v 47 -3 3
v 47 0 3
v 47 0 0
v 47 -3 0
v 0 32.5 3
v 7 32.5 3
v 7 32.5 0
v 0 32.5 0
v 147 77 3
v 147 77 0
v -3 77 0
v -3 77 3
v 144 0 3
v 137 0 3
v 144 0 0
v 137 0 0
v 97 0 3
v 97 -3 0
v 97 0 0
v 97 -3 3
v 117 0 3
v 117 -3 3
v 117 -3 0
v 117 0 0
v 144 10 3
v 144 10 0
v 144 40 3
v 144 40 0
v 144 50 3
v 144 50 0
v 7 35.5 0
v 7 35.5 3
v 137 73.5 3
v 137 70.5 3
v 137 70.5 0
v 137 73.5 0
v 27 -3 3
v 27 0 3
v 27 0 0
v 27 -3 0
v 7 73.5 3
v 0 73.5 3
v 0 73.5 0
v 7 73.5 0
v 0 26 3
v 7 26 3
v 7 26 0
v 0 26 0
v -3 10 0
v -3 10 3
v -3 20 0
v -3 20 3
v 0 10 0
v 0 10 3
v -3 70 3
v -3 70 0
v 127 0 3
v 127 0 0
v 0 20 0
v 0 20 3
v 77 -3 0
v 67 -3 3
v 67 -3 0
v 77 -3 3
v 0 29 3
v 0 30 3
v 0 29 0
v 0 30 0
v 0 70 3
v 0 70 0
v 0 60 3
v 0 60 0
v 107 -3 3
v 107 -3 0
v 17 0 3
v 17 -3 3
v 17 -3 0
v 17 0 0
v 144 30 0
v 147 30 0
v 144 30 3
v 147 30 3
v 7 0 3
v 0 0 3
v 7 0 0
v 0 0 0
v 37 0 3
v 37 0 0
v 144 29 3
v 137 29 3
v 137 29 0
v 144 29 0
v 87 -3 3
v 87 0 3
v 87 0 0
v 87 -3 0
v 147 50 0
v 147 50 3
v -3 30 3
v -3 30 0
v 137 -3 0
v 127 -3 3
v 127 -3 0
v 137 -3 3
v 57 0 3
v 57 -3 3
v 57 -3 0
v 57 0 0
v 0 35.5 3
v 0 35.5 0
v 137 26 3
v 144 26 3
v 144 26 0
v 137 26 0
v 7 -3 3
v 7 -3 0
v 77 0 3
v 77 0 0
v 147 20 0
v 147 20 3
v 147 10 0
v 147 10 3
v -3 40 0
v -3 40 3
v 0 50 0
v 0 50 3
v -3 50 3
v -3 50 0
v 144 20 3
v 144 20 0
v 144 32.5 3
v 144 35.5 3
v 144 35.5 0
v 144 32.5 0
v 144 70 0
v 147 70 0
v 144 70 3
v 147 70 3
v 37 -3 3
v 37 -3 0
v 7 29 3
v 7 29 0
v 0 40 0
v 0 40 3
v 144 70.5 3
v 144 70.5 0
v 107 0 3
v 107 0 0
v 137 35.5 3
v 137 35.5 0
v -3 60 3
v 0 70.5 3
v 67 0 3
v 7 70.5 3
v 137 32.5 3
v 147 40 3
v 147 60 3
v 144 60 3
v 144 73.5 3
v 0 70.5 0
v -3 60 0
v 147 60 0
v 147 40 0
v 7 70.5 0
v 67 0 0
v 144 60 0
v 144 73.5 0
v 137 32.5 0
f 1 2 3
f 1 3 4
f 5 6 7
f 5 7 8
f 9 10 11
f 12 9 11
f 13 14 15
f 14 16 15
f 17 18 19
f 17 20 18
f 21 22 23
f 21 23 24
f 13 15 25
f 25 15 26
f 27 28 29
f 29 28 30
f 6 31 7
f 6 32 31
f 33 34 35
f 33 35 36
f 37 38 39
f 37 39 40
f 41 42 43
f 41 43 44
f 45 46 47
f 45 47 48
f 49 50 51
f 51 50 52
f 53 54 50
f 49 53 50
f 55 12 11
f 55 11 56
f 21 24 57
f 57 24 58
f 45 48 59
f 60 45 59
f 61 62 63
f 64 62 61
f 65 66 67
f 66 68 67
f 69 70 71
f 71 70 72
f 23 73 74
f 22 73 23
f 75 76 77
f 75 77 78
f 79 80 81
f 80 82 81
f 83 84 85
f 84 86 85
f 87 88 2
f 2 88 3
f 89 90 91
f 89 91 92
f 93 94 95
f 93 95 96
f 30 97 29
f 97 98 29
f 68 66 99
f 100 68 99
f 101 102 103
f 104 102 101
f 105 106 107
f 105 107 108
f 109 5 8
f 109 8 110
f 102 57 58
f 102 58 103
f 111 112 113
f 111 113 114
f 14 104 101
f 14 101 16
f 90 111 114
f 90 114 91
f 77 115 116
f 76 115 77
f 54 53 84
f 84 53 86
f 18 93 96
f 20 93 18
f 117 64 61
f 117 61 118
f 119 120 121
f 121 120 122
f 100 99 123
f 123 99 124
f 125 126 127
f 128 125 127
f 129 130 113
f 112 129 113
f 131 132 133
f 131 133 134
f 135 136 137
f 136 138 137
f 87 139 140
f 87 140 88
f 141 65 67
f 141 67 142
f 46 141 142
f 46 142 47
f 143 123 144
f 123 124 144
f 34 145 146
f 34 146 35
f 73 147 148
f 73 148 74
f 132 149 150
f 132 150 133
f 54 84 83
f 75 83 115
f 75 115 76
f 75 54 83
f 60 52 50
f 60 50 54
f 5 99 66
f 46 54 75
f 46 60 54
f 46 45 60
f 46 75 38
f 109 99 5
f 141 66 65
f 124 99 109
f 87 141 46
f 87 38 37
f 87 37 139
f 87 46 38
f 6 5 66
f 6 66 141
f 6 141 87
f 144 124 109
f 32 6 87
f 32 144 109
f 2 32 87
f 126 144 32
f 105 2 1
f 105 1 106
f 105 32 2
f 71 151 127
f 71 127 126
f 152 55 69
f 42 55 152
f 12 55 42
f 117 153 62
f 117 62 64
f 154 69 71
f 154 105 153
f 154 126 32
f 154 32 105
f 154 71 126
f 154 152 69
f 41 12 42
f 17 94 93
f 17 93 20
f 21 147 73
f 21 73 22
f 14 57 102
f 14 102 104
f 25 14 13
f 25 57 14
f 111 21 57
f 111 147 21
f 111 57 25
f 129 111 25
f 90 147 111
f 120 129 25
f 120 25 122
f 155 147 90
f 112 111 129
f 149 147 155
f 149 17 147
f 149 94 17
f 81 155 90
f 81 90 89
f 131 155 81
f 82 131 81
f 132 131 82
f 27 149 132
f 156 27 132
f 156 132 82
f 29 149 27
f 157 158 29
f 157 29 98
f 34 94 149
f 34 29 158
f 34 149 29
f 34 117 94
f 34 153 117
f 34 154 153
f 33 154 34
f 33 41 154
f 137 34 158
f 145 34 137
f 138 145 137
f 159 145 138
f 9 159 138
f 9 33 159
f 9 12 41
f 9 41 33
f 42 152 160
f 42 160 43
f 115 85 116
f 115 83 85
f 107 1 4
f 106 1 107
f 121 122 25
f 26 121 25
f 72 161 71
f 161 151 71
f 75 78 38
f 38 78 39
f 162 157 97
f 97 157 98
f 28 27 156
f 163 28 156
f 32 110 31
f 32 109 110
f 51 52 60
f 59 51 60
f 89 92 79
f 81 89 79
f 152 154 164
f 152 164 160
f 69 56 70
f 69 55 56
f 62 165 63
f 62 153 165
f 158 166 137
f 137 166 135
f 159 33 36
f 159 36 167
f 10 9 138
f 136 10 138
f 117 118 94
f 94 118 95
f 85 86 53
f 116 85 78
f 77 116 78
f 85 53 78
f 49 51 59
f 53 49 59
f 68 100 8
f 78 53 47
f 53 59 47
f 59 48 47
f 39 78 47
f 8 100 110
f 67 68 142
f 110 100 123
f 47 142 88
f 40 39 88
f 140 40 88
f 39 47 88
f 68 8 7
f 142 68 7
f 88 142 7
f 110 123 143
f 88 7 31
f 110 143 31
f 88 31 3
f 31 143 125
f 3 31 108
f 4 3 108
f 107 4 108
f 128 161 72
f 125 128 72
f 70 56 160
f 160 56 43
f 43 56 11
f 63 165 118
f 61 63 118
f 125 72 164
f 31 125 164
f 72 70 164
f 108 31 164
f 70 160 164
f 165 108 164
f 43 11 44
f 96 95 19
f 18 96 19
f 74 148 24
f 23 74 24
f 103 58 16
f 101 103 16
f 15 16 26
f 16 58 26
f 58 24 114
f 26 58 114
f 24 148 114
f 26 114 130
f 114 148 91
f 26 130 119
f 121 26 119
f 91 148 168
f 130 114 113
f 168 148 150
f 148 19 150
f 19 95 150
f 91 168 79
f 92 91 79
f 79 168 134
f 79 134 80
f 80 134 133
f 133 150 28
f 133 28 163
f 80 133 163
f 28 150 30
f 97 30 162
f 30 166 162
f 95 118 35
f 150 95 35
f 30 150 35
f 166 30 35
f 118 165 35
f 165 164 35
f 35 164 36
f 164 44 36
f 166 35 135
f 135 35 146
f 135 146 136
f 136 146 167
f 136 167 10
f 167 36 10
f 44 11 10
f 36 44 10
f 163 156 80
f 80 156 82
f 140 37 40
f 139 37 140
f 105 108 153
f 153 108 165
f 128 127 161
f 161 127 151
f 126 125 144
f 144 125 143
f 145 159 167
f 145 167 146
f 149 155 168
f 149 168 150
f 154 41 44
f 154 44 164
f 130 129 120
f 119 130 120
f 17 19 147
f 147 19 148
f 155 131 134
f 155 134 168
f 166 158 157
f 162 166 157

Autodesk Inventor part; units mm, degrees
ref_plane "YZ Plane" through (0, 0, 0) normal (1, 0, 0) x (0, 1, 0)
ref_plane "XZ Plane" through (0, 0, 0) normal (0, 1, 0) x (-1, 0, 0)
ref_plane "XY Plane" through (0, 0, 0) normal (0, 0, 1) x (1, 0, 0)
sketch "Sketch1" plane through (0, 0, 0) normal (0, 0, 1) x (1, 0, 0)
  line L0 (0, 0) -> (144, 0)
  line L1 (144, 0) -> (144, 77)
  line L2 (144, 77) -> (0, 77)
  line L3 (0, 77) -> (0, 0)
  dimension "d0" = 144
  dimension "d1" = 77
extrude "Extrusion1" add sketch "Sketch1" along normal blind 3
sketch "Sketch2" plane through (0, 0, 3) normal (0, 0, 1) x (1, 0, 0)
  line L0 (144, 77) -> (0, 77) projected
  line L1 (0, 0) -> (144, 0) projected
  line L2 (0, 77) -> (144, 77)
  line L3 (144, 77) -> (144, 0)
  line L4 (144, 0) -> (0, 0)
  line L5 (0, 0) -> (0, 77)
  line L6 (7, 0) -> (7, -3)
  line L7 (7, -3) -> (17, -3)
  line L8 (17, -3) -> (17, 0)
  line L9 (27, 0) -> (27, -3)
  line L10 (27, -3) -> (37, -3)
  line L11 (37, -3) -> (37, 0)
  line L12 (47, 0) -> (47, -3)
  line L13 (47, -3) -> (57, -3)
  line L14 (57, -3) -> (57, 0)
  line L15 (67, 0) -> (67, -3)
  line L16 (67, -3) -> (77, -3)
  line L17 (77, -3) -> (77, 0)
  line L18 (87, 0) -> (87, -3)
  line L19 (87, -3) -> (97, -3)
  line L20 (97, -3) -> (97, 0)
  line L21 (107, 0) -> (107, -3)
  line L22 (107, -3) -> (117, -3)
  line L23 (117, -3) -> (117, 0)
  line L24 (127, 0) -> (127, -3)
  line L25 (127, -3) -> (137, -3)
  line L26 (137, -3) -> (137, 0)
  line L27 (0, 77) -> (0, 0) projected
  line L28 (0, 10) -> (-3, 10)
  line L29 (-3, 10) -> (-3, 20)
  line L30 (-3, 20) -> (0, 20)
  line L31 (-3, 40) -> (0, 40)
  line L32 (-3, 30) -> (-3, 40)
  line L33 (0, 30) -> (-3, 30)
  line L34 (-3, 60) -> (0, 60)
  line L35 (-3, 50) -> (-3, 60)
  line L36 (0, 50) -> (-3, 50)
  line L37 (144, 77) -> (0, 77) projected
  line L38 (0, 77) -> (-3, 77)
  line L39 (-3, 77) -> (-3, 70)
  line L40 (-3, 70) -> (0, 70)
  line L41 (144, 0) -> (144, 77) projected
  line L42 (144, 77) -> (147, 77)
  line L43 (147, 77) -> (147, 70)
  line L44 (147, 70) -> (144, 70)
  line L45 (144, 0) -> (144, 77) projected
  line L46 (144, 60) -> (147, 60)
  line L47 (147, 60) -> (147, 50)
  line L48 (147, 50) -> (144, 50)
  line L49 (144, 40) -> (147, 40)
  line L50 (147, 40) -> (147, 30)
  line L51 (147, 30) -> (144, 30)
  line L52 (144, 20) -> (147, 20)
  line L53 (147, 20) -> (147, 10)
  line L54 (147, 10) -> (144, 10)
  dimension "d4" = 3
  dimension "d5" = 10
  dimension "d8" = 20
  dimension "d13" = 3
  dimension "d14" = 10
  dimension "d17" = 20
  dimension "d22" = 3
  dimension "d23" = 7
  dimension "d24" = 3
extrude "Extrusion2" add sketch "Sketch2" against normal blind 3 contours L42 L43 L44 L3 | L5 L40 L39 L38 | L46 L47 L48 L3 | L5 L36 L35 L34 | L49 L50 L51 L3 | L5 L33 L32 L31 | L52 L53 L54 L3 | L5 L28 L29 L30 | L26 L25 L24 L1 | L1 L8 L7 L6 | L23 L22 L21 L1 | L1 L11 L10 L9 | L20 L19 L18 L1 | L1 L14 L13 L12 | L17 L16 L15 L1
sketch "Sketch3" plane through (0, 0, 3) normal (0, 0, 1) x (1, 0, 0)
  line L0 (0, 73.5) -> (7, 73.5)
  line L1 (7, 73.5) -> (7, 70.5)
  line L2 (7, 70.5) -> (0, 70.5)
  line L3 (0, 70.5) -> (0, 73.5)
  line L4 (137, 73.5) -> (144, 73.5)
  line L5 (144, 73.5) -> (144, 70.5)
  line L6 (144, 70.5) -> (137, 70.5)
  line L7 (137, 70.5) -> (137, 73.5)
  line L8 (0, 35.5) -> (7, 35.5)
  line L9 (7, 35.5) -> (7, 32.5)
  line L10 (7, 32.5) -> (0, 32.5)
  line L11 (0, 32.5) -> (0, 35.5)
  line L12 (137, 35.5) -> (144, 35.5)
  line L13 (144, 35.5) -> (144, 32.5)
  line L14 (144, 32.5) -> (137, 32.5)
  line L15 (137, 32.5) -> (137, 35.5)
  line L16 (7, 29) -> (7, 26)
  line L17 (7, 26) -> (0, 26)
  line L18 (0, 26) -> (0, 29)
  line L19 (0, 29) -> (7, 29)
  line L20 (144, 35.5) -> (144, 32.5)
  line L21 (144, 32.5) -> (137, 32.5)
  line L22 (137, 32.5) -> (137, 35.5)
  line L23 (137, 35.5) -> (144, 35.5)
  line L24 (144, 29) -> (144, 26)
  line L25 (144, 26) -> (137, 26)
  line L26 (137, 26) -> (137, 29)
  line L27 (137, 29) -> (144, 29)
  line L28 (-3, 77) -> (147, 77) projected
  point P0 (0, 0)
  dimension "d27" = 7
  dimension "d28" = 3
  dimension "d31" = 137
  dimension "d34" = 38
  dimension "d41" = 6.5
  dimension "d44" = 137
  dimension "d47" = 3.5
  dimension "d48" = 3.5
extrude "Extrusion3" cut sketch "Sketch3" against normal through all
properties part number "DoosjeVoorkant" material "Wood (Cherry)"
